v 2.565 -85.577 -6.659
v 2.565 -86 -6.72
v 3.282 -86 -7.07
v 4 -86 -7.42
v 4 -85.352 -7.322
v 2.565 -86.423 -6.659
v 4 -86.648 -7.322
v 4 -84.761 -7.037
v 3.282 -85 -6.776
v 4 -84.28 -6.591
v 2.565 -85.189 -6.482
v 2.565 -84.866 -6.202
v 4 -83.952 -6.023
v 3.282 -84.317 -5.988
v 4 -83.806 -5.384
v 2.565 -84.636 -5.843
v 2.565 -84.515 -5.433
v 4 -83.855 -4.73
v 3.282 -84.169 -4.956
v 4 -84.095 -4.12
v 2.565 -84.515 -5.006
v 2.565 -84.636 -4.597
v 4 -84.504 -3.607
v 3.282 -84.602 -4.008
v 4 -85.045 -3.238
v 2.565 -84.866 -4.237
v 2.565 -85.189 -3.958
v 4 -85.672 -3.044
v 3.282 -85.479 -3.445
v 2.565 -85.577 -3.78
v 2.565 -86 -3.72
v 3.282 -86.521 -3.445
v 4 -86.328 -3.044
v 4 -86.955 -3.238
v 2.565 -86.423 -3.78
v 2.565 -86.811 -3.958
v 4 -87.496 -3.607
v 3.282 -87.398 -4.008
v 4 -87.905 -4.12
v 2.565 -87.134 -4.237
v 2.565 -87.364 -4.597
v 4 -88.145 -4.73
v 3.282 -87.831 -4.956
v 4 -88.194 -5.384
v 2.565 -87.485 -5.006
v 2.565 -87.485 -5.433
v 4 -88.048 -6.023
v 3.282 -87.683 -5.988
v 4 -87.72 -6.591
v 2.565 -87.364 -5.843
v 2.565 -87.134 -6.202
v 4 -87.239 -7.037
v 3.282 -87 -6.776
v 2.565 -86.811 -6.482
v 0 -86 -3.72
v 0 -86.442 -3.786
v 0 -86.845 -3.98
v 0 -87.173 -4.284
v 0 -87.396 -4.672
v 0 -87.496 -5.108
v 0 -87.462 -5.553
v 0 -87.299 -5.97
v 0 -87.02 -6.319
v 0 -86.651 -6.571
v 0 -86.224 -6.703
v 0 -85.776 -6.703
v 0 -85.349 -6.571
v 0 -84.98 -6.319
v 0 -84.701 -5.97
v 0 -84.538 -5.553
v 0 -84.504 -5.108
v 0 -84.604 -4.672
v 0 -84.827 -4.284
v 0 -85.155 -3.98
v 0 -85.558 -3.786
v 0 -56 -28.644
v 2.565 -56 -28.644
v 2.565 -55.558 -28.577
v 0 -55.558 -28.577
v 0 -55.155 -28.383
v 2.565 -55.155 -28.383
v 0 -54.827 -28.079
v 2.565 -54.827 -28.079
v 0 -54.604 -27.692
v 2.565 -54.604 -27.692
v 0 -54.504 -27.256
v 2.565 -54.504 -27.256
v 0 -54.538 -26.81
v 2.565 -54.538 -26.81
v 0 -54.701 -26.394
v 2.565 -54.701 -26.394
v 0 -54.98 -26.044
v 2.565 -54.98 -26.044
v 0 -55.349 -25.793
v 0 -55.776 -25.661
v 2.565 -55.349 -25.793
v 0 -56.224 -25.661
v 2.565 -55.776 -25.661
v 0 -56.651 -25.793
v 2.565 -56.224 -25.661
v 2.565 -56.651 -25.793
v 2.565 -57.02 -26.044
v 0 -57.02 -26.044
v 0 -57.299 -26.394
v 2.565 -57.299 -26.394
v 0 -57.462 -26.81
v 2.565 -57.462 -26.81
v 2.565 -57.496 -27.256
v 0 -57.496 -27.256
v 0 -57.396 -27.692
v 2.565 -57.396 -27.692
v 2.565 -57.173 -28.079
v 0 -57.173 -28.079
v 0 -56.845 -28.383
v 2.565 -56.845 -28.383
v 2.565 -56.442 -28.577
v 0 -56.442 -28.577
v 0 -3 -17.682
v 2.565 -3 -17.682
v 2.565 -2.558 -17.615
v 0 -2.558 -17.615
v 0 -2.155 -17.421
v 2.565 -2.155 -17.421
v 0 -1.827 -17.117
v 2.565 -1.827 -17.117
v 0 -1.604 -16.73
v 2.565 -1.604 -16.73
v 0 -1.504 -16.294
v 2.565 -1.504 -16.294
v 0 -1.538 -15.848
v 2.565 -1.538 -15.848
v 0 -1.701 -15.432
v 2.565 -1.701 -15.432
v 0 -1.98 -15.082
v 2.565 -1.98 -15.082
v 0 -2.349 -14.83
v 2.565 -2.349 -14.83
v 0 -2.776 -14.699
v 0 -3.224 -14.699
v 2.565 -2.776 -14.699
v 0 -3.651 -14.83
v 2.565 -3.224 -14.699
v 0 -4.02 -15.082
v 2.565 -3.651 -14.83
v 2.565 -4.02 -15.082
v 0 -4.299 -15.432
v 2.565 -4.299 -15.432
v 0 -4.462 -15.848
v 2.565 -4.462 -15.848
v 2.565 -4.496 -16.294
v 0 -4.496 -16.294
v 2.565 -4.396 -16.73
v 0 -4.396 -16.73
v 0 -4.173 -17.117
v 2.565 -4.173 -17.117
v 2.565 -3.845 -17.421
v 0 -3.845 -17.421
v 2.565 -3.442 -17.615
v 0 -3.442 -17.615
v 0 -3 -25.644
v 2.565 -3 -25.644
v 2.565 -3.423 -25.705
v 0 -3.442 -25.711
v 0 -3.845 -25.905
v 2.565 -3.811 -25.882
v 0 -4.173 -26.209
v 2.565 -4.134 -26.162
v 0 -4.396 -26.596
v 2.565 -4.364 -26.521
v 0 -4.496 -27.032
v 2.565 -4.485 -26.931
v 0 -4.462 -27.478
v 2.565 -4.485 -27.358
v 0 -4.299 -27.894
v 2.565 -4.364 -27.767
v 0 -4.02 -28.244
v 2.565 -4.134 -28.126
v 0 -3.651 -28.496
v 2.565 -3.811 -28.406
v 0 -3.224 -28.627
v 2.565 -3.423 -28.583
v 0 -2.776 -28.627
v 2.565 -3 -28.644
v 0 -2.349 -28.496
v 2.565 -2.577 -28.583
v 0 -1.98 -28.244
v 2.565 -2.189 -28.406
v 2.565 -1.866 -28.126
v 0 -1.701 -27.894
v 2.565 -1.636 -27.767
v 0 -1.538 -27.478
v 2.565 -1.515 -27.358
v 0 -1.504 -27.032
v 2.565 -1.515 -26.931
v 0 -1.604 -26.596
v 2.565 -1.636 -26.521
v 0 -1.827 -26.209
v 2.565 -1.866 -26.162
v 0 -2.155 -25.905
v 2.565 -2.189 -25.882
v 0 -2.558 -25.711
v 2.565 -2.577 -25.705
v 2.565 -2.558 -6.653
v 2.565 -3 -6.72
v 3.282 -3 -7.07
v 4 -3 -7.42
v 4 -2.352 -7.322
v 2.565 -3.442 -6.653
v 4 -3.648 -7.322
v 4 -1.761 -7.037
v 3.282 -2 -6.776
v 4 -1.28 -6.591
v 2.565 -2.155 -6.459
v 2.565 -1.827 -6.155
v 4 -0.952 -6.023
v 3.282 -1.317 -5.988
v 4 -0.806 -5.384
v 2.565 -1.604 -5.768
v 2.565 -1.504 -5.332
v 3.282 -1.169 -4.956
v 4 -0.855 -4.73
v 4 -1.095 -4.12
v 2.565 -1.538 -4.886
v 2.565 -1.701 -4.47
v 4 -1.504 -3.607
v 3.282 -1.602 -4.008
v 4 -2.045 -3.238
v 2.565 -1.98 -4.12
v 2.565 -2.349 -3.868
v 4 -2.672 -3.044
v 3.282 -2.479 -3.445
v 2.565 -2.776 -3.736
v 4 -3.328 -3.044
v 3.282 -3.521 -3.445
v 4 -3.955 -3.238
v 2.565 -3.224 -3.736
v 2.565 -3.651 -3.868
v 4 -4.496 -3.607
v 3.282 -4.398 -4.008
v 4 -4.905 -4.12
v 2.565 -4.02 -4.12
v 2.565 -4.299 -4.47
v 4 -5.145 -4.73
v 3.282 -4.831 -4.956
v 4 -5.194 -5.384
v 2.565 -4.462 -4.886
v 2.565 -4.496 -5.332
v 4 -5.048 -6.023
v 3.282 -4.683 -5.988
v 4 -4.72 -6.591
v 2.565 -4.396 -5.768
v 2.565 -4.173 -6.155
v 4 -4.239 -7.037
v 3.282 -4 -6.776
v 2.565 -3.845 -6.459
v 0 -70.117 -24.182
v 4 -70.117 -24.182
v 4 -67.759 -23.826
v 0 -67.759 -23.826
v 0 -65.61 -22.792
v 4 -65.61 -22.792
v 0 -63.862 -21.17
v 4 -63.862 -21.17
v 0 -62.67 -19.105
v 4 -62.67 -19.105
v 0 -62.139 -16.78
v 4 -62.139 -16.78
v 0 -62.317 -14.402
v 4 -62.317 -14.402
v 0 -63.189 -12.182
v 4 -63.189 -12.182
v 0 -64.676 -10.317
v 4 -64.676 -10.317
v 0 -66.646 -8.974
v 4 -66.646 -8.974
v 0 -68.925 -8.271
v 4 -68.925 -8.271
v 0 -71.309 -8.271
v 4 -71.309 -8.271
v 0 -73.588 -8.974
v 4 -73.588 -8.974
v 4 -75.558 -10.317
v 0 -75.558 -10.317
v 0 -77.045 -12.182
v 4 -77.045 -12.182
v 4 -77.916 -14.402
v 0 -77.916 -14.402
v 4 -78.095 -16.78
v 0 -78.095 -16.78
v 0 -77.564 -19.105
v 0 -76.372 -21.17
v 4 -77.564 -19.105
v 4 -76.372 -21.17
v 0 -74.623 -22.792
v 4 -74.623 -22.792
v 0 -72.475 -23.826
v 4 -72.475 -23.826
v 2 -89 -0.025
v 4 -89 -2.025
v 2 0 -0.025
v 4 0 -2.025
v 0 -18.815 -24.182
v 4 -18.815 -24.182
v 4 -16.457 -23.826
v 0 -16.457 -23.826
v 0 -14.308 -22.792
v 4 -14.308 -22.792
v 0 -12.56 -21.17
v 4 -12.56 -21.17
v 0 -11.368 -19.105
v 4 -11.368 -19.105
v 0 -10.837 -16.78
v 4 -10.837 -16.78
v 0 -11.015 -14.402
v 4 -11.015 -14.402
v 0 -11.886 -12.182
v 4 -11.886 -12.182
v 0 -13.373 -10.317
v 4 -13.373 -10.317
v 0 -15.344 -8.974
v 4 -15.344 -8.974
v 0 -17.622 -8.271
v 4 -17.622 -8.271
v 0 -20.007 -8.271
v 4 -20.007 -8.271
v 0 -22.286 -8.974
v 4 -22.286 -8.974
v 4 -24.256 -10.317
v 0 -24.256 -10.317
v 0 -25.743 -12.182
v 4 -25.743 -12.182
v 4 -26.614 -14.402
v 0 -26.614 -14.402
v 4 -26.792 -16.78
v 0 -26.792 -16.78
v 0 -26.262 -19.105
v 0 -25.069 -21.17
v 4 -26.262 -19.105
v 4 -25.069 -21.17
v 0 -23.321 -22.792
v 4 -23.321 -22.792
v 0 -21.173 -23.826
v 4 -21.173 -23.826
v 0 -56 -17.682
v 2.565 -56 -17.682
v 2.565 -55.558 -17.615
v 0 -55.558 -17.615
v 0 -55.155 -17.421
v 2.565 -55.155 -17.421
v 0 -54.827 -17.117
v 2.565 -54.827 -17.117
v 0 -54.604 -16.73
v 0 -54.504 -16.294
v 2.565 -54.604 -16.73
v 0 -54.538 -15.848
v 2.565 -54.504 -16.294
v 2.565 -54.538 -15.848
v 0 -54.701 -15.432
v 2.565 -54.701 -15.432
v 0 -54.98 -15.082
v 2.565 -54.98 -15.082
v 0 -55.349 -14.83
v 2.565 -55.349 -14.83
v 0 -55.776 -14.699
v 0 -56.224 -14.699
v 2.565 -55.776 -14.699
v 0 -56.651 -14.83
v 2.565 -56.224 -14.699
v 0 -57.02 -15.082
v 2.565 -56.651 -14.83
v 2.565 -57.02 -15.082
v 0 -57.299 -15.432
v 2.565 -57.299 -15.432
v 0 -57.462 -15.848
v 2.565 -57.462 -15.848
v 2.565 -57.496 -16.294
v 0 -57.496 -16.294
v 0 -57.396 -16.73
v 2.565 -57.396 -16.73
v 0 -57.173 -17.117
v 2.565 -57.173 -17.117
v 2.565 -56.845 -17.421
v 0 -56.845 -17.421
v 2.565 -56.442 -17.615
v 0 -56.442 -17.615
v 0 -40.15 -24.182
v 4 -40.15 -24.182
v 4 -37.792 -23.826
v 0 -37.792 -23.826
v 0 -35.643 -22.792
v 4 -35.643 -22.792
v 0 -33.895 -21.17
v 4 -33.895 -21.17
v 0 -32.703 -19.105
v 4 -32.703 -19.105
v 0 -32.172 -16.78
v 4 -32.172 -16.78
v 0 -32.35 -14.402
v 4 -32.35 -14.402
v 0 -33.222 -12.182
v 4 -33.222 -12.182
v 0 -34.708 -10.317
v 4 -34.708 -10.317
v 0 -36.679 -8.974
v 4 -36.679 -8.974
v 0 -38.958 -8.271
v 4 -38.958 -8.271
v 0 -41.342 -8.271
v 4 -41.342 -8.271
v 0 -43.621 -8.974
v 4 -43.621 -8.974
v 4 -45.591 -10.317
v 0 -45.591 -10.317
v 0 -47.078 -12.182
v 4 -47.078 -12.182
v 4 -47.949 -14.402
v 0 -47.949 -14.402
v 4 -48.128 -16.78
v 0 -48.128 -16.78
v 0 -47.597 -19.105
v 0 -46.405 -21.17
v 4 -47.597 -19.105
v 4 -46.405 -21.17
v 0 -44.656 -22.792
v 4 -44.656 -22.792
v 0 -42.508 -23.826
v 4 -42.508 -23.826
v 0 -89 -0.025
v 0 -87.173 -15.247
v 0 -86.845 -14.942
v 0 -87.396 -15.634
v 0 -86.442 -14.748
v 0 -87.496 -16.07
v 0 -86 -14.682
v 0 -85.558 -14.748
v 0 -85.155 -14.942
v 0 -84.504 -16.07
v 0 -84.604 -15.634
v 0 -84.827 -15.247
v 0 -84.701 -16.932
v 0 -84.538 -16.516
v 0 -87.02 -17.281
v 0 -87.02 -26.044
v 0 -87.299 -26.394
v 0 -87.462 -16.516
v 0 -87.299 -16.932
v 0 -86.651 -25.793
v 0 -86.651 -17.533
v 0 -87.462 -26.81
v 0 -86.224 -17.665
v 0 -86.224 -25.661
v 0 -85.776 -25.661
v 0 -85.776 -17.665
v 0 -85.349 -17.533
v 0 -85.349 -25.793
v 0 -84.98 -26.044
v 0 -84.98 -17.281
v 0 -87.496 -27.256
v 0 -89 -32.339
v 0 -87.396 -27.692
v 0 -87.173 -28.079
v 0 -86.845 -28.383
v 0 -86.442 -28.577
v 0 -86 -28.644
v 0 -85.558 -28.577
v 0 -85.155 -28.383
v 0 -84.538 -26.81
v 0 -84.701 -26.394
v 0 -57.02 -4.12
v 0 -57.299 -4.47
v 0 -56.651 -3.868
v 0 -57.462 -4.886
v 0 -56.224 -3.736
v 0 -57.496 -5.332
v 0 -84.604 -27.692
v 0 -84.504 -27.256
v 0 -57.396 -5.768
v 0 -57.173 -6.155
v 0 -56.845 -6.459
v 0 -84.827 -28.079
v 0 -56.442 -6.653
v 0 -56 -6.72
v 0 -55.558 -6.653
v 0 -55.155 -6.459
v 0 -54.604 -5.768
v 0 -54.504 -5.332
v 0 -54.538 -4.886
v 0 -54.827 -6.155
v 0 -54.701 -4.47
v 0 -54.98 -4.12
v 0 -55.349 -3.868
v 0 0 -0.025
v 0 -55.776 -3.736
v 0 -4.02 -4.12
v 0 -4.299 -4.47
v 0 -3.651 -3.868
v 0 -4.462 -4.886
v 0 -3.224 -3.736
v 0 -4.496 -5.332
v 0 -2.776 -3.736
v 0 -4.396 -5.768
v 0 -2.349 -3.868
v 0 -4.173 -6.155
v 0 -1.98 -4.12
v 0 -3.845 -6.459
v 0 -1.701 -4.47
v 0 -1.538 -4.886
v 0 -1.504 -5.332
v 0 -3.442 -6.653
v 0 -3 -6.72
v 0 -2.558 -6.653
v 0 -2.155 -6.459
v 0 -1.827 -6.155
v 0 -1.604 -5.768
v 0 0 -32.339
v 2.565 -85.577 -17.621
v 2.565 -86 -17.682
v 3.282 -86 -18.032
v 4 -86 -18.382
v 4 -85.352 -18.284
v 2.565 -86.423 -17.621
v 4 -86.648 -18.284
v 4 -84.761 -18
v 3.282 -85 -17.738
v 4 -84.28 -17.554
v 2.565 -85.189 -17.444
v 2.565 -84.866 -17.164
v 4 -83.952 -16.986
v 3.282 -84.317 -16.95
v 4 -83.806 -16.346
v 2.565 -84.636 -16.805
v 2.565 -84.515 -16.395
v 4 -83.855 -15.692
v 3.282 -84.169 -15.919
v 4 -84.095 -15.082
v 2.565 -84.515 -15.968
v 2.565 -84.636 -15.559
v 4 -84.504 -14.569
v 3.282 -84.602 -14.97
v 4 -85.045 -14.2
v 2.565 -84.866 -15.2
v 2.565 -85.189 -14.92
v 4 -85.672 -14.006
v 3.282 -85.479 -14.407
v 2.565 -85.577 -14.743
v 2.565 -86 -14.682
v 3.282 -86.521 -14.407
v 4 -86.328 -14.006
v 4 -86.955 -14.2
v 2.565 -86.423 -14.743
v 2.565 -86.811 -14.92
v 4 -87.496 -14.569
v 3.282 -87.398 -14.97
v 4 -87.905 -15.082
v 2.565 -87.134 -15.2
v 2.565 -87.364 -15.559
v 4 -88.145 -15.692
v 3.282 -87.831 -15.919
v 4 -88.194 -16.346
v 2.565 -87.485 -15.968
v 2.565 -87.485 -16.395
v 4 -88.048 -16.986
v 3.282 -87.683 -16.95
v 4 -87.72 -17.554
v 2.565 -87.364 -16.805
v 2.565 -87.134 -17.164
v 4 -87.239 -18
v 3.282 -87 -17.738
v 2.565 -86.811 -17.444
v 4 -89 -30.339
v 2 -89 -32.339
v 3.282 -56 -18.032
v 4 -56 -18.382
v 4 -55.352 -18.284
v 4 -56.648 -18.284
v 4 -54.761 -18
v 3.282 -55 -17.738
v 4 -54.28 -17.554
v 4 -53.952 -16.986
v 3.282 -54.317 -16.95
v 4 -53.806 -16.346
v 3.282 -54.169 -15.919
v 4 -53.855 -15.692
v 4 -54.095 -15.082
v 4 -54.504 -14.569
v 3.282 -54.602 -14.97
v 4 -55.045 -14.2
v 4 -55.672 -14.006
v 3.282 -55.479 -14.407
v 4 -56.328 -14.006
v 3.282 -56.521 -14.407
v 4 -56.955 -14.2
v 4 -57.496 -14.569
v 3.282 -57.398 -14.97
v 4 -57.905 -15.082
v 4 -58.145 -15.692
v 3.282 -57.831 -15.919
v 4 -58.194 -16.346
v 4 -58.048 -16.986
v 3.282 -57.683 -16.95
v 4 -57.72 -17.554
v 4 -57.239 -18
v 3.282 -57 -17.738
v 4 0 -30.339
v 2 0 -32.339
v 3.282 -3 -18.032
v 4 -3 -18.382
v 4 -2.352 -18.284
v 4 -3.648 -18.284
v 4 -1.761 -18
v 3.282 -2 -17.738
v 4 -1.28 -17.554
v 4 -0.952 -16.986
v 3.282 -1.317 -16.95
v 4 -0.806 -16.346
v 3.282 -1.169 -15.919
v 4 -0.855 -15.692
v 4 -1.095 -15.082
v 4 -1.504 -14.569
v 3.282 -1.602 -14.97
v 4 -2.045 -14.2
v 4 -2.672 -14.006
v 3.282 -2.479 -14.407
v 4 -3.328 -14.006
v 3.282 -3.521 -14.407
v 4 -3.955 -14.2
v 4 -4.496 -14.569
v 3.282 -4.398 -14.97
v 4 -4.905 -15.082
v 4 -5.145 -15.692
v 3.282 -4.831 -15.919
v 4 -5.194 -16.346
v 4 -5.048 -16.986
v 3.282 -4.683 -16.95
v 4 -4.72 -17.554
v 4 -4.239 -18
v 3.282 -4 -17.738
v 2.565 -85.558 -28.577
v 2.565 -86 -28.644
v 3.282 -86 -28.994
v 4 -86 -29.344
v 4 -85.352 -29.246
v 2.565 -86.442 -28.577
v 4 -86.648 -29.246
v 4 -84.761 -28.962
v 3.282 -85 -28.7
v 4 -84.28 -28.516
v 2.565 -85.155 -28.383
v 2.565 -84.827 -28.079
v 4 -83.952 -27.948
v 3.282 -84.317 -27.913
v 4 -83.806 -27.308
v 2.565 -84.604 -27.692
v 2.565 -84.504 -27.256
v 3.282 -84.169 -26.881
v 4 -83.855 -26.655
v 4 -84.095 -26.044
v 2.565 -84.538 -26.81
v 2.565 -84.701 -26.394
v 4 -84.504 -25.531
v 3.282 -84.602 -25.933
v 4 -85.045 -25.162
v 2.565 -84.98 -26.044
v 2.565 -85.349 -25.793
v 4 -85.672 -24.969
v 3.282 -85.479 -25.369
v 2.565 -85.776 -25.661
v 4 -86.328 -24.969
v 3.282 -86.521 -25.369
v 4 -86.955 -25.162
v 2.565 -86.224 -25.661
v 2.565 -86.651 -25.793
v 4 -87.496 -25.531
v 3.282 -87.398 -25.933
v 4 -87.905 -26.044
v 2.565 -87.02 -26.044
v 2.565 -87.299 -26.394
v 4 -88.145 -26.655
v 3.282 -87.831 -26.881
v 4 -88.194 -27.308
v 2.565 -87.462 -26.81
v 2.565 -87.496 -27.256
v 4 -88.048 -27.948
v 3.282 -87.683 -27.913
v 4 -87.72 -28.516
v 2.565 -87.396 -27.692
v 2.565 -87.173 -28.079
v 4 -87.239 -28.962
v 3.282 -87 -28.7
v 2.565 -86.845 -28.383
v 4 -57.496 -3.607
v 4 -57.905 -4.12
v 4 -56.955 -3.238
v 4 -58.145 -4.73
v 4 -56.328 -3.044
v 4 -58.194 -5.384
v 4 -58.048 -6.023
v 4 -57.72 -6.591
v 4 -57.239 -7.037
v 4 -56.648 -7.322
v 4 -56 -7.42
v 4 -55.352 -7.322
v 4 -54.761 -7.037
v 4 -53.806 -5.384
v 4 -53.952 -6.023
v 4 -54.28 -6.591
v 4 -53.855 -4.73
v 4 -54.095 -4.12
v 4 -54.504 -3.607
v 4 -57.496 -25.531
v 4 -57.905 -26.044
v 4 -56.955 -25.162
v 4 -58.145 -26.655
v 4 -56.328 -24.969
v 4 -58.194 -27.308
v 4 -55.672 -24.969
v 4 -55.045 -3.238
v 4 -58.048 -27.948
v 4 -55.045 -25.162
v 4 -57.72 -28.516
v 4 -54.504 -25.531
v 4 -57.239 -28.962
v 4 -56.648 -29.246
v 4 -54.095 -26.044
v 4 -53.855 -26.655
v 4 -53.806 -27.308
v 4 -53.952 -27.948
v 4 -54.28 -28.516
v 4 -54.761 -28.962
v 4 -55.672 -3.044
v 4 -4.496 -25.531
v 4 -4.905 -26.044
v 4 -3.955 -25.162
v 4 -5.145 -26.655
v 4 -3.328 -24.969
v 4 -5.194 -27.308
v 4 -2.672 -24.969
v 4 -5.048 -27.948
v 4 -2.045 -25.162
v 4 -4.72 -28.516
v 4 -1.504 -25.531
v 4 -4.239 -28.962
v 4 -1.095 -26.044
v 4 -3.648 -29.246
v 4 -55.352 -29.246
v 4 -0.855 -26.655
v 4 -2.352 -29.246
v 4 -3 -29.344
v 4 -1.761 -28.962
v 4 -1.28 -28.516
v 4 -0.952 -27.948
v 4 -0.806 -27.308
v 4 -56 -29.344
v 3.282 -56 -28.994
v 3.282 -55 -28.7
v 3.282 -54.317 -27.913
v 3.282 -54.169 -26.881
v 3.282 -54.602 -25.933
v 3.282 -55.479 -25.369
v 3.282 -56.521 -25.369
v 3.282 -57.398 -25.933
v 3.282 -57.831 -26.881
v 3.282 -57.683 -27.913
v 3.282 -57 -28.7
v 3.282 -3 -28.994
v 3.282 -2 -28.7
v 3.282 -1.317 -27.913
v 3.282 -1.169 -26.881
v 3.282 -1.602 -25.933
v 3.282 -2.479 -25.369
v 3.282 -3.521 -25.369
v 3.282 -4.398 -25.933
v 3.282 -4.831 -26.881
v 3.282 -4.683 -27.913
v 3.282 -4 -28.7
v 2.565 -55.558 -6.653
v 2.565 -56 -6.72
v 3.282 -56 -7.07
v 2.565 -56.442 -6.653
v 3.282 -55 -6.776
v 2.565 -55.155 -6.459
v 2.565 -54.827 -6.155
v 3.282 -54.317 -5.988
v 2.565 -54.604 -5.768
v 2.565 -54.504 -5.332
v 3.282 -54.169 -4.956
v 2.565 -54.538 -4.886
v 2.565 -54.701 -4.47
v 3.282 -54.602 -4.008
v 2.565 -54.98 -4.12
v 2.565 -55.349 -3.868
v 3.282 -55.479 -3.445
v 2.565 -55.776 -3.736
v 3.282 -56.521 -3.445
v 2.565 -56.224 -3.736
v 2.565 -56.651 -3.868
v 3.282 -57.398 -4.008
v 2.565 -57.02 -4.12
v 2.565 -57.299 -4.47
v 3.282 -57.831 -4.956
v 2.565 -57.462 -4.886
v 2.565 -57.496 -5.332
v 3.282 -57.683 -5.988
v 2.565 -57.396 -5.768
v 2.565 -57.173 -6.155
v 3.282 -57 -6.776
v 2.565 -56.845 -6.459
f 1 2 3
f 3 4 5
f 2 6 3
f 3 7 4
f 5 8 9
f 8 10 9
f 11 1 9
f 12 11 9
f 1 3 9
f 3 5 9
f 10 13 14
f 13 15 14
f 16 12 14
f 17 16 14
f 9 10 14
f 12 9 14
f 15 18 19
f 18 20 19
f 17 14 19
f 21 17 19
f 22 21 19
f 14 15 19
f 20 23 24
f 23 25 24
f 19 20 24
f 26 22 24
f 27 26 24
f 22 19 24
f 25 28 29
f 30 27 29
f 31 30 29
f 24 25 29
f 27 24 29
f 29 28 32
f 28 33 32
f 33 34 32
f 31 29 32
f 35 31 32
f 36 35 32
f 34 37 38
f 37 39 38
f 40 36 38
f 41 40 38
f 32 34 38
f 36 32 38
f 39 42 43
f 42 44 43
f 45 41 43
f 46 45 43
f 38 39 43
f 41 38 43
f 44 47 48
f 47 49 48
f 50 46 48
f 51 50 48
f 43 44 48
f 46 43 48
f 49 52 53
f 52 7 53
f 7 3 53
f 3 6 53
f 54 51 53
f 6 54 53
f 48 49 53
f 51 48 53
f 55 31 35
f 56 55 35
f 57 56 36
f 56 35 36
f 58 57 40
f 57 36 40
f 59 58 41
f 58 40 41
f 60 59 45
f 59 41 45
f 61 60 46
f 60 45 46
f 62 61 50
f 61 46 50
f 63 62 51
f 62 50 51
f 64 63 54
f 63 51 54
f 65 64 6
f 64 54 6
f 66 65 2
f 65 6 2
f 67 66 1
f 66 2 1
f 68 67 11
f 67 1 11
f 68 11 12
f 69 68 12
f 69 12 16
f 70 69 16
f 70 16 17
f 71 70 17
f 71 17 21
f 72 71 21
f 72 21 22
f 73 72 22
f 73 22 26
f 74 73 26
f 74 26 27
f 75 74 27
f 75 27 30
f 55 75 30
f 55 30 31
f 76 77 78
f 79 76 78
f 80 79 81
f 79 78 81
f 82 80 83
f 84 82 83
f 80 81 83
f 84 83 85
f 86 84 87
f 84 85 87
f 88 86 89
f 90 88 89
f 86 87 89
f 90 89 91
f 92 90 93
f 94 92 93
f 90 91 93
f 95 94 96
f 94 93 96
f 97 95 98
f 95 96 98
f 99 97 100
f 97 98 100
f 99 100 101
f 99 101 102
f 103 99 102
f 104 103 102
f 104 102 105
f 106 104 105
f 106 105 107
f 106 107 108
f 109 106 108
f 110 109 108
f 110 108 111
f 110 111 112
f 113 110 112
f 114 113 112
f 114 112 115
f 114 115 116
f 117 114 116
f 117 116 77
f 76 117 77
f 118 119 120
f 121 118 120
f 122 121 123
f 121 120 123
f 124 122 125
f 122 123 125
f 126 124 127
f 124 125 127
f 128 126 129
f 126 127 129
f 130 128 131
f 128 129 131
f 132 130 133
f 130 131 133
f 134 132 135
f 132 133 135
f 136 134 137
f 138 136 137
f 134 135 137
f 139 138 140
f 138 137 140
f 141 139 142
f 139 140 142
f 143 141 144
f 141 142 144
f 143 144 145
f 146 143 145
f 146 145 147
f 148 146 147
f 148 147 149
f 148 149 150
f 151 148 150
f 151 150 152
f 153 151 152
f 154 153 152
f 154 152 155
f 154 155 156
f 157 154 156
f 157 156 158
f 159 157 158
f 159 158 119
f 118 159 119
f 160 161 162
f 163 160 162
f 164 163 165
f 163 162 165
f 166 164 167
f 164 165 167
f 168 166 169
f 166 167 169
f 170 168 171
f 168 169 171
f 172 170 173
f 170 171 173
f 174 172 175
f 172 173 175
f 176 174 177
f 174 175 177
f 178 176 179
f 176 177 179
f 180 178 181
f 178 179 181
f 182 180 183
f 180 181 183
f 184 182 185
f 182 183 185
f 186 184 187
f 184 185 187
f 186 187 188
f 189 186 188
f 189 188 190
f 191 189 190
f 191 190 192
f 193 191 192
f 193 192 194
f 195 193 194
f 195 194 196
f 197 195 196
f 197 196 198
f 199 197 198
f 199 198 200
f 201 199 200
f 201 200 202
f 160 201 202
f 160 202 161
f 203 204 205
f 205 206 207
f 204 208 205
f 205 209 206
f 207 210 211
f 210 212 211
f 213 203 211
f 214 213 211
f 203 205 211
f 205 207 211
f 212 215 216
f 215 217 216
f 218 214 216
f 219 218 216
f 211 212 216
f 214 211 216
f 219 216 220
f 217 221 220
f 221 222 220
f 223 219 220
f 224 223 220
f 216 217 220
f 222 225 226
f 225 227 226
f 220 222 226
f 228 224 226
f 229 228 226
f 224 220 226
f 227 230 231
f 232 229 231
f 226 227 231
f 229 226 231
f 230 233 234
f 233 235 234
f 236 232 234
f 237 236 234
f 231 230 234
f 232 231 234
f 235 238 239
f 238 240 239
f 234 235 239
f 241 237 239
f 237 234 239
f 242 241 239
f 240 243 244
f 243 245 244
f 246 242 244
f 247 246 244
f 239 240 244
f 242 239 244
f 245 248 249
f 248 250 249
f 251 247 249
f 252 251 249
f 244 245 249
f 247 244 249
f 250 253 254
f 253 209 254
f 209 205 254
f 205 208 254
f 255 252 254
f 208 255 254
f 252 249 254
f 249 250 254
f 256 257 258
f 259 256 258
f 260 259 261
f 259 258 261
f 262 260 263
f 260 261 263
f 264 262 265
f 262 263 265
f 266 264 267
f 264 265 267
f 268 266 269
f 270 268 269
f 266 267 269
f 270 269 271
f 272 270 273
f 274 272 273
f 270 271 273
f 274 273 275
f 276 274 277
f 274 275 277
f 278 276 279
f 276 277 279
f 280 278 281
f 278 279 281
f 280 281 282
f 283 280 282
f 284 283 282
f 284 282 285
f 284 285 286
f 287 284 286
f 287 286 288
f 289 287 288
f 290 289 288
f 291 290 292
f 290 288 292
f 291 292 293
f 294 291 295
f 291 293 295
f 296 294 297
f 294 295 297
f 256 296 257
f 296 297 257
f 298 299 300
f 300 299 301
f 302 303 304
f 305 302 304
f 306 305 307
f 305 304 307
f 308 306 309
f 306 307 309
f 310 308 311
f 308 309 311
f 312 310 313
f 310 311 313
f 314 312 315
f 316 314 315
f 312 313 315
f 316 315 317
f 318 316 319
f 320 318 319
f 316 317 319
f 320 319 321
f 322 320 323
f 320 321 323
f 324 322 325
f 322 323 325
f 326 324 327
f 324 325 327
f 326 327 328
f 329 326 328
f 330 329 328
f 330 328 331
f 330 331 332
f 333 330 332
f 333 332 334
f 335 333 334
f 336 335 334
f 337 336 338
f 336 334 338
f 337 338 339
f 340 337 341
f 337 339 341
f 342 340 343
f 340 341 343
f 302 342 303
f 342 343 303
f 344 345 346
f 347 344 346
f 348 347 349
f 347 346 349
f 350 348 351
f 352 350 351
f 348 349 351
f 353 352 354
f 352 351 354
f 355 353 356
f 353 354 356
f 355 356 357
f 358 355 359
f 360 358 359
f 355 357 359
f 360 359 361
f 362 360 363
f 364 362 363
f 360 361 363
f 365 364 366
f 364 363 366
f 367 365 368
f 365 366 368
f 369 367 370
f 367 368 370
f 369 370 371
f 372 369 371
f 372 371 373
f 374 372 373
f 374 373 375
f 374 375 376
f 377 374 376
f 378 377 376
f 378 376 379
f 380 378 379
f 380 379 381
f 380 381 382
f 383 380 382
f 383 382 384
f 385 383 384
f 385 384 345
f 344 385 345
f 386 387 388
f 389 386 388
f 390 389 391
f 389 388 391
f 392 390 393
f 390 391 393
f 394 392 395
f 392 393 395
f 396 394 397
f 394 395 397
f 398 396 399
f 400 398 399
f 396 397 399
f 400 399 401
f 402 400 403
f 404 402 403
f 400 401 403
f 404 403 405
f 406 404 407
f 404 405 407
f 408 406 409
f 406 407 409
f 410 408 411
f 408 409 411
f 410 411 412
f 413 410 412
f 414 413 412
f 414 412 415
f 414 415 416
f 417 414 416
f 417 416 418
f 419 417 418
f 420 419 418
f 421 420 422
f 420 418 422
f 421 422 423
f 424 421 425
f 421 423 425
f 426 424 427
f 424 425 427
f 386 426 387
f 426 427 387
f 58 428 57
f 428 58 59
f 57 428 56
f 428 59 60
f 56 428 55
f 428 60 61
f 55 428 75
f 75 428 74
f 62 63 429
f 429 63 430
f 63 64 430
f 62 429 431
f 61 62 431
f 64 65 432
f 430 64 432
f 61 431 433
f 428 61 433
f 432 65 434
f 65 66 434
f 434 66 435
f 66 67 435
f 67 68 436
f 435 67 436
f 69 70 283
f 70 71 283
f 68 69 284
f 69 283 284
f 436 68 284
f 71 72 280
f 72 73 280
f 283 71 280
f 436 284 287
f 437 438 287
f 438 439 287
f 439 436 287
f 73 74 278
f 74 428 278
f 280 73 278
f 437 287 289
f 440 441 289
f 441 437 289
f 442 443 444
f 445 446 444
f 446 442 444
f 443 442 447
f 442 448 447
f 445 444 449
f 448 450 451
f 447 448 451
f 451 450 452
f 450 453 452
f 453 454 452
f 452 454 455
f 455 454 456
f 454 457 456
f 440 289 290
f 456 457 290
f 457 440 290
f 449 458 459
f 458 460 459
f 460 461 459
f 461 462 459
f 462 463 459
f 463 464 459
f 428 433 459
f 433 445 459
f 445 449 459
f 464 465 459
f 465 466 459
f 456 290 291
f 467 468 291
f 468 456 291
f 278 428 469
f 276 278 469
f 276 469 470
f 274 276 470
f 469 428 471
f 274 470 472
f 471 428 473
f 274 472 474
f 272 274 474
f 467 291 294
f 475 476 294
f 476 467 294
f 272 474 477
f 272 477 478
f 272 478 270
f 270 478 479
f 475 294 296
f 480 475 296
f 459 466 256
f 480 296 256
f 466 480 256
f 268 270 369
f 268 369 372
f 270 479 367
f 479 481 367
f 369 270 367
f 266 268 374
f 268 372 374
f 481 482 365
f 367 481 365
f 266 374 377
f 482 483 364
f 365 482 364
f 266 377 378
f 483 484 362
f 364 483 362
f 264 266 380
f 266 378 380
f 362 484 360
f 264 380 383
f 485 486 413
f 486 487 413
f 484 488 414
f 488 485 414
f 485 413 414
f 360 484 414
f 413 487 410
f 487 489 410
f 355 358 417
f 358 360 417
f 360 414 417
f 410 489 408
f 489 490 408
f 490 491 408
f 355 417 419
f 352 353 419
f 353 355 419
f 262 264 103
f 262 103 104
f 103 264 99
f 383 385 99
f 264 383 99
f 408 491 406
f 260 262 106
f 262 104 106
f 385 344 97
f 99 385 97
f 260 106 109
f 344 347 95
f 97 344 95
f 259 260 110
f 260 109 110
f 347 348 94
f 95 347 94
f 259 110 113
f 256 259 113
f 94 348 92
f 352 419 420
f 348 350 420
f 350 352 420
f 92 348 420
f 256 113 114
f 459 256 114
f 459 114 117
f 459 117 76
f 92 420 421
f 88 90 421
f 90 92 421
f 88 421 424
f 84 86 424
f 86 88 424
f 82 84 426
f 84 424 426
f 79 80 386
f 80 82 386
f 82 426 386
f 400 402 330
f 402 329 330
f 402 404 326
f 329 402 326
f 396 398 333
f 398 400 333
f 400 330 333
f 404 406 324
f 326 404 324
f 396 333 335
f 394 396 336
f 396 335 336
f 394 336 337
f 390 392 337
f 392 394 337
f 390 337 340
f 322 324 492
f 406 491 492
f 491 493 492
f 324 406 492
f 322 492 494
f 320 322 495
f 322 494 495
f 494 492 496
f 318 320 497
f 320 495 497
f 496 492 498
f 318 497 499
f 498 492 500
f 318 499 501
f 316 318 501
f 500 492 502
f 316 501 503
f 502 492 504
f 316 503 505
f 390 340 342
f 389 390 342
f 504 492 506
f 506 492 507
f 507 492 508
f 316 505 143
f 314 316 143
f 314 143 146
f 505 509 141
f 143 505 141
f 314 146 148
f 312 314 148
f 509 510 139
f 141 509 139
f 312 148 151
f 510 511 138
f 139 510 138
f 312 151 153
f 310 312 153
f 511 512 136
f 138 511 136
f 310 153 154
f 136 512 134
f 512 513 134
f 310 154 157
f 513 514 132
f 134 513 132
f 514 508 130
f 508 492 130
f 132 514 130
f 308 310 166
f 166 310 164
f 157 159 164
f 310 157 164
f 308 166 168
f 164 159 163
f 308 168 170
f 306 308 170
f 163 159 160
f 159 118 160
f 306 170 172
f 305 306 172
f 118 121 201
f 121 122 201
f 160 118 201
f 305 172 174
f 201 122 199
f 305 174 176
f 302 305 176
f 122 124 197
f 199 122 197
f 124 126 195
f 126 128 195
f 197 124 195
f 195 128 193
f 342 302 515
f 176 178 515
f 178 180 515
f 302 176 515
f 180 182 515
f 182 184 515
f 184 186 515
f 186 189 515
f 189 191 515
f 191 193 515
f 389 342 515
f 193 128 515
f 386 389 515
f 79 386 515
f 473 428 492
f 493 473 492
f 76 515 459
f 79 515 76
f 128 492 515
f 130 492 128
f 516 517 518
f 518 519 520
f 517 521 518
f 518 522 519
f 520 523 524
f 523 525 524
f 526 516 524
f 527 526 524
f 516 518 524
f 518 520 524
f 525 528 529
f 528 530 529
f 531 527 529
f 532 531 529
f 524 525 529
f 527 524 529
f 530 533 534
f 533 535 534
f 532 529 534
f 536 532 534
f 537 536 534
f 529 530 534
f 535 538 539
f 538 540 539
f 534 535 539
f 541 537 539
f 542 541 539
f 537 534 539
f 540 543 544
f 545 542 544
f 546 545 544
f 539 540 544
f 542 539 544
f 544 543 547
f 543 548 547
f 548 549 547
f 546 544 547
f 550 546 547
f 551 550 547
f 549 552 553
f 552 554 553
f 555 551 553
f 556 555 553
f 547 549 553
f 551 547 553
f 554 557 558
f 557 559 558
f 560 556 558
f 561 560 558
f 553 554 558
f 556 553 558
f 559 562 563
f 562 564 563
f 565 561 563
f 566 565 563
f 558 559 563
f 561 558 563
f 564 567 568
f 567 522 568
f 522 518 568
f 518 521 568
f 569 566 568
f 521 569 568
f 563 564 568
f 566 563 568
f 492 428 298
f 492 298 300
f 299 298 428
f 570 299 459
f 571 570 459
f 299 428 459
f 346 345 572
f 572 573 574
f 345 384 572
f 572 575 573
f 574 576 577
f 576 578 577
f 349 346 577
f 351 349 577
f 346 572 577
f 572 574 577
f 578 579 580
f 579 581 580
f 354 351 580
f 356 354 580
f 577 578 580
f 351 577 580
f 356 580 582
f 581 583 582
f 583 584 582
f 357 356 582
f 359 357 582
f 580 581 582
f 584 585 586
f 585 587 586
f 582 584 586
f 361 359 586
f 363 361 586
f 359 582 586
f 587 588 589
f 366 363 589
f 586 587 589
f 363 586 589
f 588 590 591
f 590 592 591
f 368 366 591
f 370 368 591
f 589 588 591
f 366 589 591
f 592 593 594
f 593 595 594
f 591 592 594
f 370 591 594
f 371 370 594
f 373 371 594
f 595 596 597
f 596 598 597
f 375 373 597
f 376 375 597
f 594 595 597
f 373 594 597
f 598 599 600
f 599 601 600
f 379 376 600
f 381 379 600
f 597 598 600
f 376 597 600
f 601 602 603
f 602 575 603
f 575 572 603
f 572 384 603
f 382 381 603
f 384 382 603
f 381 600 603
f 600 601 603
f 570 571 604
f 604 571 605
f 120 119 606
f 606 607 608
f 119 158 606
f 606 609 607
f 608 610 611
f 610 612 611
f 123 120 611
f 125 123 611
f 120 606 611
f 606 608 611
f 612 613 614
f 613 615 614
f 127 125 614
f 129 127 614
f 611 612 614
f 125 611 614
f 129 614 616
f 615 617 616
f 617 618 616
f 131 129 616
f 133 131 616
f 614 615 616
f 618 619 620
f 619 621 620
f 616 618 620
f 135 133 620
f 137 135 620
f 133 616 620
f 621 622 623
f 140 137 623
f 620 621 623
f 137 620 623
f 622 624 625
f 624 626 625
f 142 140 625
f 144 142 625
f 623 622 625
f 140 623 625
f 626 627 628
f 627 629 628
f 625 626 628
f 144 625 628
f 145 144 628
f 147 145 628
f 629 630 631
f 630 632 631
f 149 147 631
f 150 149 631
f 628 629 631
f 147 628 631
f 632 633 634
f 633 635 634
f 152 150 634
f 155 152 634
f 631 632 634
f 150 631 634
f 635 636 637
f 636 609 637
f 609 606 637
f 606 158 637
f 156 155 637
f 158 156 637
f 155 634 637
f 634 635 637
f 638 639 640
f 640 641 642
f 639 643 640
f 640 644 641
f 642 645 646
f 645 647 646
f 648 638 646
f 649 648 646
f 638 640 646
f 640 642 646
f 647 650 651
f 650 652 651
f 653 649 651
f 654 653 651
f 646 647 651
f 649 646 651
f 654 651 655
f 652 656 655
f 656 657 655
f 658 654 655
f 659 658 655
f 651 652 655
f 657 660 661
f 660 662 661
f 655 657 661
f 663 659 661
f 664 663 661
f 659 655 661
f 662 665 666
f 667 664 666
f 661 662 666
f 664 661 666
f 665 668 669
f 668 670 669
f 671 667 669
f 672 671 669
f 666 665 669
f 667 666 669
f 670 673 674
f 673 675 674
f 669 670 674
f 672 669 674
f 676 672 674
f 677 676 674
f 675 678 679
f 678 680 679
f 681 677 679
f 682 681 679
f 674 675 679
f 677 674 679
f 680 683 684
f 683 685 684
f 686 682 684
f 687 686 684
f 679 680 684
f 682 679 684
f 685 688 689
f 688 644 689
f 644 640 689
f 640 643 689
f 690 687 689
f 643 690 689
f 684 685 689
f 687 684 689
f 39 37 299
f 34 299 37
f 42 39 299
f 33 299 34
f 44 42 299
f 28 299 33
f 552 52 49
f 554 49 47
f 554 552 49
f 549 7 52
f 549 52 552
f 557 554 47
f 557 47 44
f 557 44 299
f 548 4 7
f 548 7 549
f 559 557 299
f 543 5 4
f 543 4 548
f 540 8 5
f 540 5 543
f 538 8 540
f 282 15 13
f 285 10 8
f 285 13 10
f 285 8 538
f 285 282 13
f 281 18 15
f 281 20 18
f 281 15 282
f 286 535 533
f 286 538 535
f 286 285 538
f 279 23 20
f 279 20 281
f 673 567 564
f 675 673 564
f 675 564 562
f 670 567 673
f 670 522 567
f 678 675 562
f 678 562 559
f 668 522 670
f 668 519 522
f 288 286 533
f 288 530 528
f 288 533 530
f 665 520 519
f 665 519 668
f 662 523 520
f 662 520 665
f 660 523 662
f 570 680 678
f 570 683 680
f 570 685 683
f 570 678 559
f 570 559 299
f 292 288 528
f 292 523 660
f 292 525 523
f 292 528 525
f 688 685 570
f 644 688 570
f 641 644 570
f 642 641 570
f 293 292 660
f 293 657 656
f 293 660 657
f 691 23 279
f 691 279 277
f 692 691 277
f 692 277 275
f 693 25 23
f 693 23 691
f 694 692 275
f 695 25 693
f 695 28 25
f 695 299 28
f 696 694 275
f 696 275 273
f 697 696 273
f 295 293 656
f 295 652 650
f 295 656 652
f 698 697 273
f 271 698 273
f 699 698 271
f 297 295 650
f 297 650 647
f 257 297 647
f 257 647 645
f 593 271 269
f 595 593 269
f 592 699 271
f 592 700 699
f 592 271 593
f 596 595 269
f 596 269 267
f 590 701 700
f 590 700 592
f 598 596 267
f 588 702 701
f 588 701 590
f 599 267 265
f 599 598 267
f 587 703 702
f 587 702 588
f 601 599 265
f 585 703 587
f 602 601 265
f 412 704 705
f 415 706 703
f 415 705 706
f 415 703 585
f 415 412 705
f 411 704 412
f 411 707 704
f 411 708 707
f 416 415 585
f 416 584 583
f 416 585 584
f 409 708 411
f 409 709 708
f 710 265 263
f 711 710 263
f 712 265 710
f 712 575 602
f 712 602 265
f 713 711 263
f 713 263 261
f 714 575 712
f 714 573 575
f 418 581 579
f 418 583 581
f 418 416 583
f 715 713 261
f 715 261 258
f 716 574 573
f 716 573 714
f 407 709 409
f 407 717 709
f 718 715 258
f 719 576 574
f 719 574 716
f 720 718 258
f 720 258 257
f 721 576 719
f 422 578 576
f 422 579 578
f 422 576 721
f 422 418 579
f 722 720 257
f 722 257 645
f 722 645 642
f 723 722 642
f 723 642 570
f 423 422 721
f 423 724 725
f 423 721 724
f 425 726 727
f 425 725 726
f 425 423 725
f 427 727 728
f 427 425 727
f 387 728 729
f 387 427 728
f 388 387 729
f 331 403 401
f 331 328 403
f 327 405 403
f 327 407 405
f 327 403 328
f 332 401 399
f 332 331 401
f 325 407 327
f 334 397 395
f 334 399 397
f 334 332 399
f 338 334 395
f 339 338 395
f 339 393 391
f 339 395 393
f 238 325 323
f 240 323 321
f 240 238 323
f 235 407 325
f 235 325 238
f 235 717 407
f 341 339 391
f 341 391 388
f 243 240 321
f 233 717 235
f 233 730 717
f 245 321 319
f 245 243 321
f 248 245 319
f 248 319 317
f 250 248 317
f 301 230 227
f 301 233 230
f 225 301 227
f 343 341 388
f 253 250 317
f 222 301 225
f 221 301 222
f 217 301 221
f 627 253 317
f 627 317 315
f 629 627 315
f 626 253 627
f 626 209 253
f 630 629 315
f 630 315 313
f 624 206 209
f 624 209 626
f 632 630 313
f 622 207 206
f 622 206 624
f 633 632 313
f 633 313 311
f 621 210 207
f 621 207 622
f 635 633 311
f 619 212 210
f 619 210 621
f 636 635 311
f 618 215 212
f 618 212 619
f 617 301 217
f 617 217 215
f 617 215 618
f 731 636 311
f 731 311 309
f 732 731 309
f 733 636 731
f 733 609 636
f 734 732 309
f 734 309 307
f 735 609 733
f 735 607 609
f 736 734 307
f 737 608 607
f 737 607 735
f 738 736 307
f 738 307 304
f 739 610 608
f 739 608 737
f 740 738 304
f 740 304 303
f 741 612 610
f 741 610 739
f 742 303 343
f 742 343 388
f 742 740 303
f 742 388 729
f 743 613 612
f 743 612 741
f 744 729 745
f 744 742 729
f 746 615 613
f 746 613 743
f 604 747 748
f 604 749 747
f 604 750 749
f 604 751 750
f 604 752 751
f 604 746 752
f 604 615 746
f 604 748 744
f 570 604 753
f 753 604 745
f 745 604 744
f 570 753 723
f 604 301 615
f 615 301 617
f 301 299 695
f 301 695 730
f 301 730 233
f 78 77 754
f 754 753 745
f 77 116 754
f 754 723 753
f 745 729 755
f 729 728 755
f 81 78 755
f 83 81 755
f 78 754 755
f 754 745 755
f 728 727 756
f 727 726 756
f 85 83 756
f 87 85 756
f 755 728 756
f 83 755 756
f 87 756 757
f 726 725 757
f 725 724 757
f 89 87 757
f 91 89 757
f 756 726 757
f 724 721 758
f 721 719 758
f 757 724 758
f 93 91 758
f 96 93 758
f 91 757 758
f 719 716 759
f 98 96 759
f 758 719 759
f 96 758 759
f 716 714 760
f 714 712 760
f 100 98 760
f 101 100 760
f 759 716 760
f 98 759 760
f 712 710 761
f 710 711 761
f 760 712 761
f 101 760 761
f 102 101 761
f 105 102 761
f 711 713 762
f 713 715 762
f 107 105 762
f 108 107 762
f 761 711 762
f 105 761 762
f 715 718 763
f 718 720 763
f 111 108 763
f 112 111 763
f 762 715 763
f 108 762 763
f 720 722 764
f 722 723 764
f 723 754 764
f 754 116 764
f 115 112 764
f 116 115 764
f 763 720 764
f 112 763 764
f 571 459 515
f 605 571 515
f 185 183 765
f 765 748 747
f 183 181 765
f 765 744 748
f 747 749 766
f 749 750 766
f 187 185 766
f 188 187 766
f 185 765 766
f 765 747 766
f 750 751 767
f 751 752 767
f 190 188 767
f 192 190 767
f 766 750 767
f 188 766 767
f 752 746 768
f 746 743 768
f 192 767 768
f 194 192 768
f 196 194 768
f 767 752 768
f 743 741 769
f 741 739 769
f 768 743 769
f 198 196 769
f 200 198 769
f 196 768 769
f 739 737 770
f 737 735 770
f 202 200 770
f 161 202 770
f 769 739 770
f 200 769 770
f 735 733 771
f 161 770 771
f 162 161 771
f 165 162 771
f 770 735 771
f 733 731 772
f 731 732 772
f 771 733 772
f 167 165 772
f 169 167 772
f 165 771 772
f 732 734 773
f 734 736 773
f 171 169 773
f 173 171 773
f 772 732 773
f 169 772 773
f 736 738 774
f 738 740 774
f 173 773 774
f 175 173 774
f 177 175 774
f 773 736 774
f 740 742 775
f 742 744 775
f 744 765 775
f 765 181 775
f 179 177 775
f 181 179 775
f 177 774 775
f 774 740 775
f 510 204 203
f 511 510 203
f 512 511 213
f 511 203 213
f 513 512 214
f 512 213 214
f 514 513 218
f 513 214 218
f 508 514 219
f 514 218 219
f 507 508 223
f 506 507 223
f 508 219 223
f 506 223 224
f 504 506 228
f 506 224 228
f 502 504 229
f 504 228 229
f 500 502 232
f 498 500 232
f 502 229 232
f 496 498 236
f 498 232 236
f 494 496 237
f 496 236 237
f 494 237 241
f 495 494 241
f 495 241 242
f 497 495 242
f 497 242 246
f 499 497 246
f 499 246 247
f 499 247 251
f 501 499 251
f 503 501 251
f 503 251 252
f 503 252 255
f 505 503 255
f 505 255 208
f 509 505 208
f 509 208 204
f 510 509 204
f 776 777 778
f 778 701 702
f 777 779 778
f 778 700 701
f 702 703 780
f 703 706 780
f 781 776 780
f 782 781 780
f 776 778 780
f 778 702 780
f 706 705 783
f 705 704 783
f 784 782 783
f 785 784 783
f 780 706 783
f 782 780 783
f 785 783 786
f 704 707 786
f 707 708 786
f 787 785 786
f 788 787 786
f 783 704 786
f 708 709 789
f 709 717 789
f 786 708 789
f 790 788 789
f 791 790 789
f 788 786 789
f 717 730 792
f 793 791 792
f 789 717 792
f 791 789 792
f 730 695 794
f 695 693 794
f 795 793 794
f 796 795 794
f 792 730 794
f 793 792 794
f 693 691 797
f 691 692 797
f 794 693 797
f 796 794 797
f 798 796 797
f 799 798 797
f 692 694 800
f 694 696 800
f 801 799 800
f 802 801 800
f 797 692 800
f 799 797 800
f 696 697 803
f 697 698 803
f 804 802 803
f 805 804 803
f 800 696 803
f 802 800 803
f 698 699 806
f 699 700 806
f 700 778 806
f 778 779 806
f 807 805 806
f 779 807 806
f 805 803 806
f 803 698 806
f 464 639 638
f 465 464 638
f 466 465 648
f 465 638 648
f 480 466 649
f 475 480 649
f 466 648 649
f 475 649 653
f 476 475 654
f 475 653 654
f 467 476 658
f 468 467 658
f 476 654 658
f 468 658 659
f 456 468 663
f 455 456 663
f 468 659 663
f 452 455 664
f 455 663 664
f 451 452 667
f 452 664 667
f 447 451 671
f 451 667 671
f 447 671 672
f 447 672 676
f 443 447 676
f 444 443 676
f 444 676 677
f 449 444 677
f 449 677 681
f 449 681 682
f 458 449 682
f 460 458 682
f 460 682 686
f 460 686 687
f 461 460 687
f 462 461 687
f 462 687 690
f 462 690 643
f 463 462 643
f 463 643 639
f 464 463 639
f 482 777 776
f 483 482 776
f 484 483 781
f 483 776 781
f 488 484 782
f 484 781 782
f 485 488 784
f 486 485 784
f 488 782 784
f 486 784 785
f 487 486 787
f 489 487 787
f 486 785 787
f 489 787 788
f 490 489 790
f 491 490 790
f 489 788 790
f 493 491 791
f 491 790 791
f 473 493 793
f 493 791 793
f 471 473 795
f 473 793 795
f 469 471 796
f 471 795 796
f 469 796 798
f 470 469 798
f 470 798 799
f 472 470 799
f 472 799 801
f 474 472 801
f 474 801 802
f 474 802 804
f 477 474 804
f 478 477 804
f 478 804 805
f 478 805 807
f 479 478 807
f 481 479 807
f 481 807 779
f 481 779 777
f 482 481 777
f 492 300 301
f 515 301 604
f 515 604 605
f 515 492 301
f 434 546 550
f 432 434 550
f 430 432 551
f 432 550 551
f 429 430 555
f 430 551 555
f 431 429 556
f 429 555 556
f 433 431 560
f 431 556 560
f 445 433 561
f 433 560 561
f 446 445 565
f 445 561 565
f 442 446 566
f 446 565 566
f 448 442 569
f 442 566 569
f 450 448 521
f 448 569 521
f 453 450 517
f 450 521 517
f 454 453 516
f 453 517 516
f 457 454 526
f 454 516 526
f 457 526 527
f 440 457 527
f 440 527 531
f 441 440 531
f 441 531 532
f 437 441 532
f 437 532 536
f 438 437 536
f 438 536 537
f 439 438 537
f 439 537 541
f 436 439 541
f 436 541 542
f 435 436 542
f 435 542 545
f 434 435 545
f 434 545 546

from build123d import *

# Parameters (mm, degrees)
SKETCH1_W                    = 32.31333688
SKETCH1_H                    = 89
EXTRUDE1_DEPTH               = 4
SKETCH2_R                    = 1.5
SKETCH2_R_2                  = 8
CUT_EXTRUDE1_DEPTH           = 4
CHAMFER1_SIZE                = 2
SKETCH4_R                    = 2.2
CUT_EXTRUDE2_DEPTH           = 1.5
CUT_EXTRUDE2_DRAFT           = -26
CUT_EXTRUDE2_PROFILE_2_DEPTH = 1.5
CUT_EXTRUDE2_PROFILE_2_DRAFT = -26
CUT_EXTRUDE2_PROFILE_3_DEPTH = 1.5
CUT_EXTRUDE2_PROFILE_3_DRAFT = -26
CUT_EXTRUDE2_PROFILE_4_DEPTH = 1.5
CUT_EXTRUDE2_PROFILE_4_DRAFT = -26
CUT_EXTRUDE2_PROFILE_5_DEPTH = 1.5
CUT_EXTRUDE2_PROFILE_5_DRAFT = -26
CUT_EXTRUDE2_PROFILE_6_DEPTH = 1.5
CUT_EXTRUDE2_PROFILE_6_DRAFT = -26
CUT_EXTRUDE2_PROFILE_7_DEPTH = 1.5
CUT_EXTRUDE2_PROFILE_7_DRAFT = -26
CUT_EXTRUDE2_PROFILE_8_DEPTH = 1.5
CUT_EXTRUDE2_PROFILE_8_DRAFT = -26
CUT_EXTRUDE2_PROFILE_9_DEPTH = 1.5
CUT_EXTRUDE2_PROFILE_9_DRAFT = -26


with BuildPart() as part:
    # Sketch1 → Extrude1 (new body)
    with BuildSketch(Plane(origin=(0, 0, 0), x_dir=(0, 0, -1), z_dir=(1, 0, 0))):
        with Locations((16.181856, -44.5)):
            Rectangle(SKETCH1_W, SKETCH1_H)
    extrude(amount=EXTRUDE1_DEPTH)

    # Sketch2 → Cut-Extrude1 (cut)
    with BuildSketch(Plane(origin=(4, 0, 0), x_dir=(0, 0, -1), z_dir=(1, 0, 0))):
        with Locations((5.219637339, -3)):
            Circle(SKETCH2_R)
        with Locations(Location((27.14407466, -3, 0), (0, 0, 180))):
            Circle(SKETCH2_R)
        with Locations((16.181856, -3)):
            Circle(SKETCH2_R)
        with Locations((27.14407466, -86)):
            Circle(SKETCH2_R)
        with Locations(Location((16.181856, -86, 0), (0, 0, 180))):
            Circle(SKETCH2_R)
        with Locations(Location((5.219637339, -86, 0), (0, 0, 180))):
            Circle(SKETCH2_R)
        with Locations((5.219637339, -56)):
            Circle(SKETCH2_R)
        with Locations((16.181856, -56)):
            Circle(SKETCH2_R)
        with Locations((27.14407466, -56)):
            Circle(SKETCH2_R)
        with Locations((16.181856, -18.814665041)):
            Circle(SKETCH2_R_2)
        with Locations((16.181856, -40.149876352)):
            Circle(SKETCH2_R_2)
        with Locations((16.181856, -70.116890711)):
            Circle(SKETCH2_R_2)
    extrude(amount=-CUT_EXTRUDE1_DEPTH, mode=Mode.SUBTRACT)

    # Chamfer1
    chamfer1_edges = [part.edges().sort_by_distance(p)[0] for p in [
        (4, -44.5, -32.33852444),
        (4, -44.5, -0.02518756),
    ]]
    chamfer(chamfer1_edges, length=CHAMFER1_SIZE)


with BuildPart() as cut_extrude2_tool:
    # Sketch4 → Cut-Extrude2 (with draft: the straight prism first)
    with BuildSketch(Plane(origin=(4, 0, 0), x_dir=(0, 0, -1), z_dir=(1, 0, 0))):
        with Locations((5.219637339, -3)):
            Circle(SKETCH4_R)
    extrude(amount=-CUT_EXTRUDE2_DEPTH)
    # Cut-Extrude2: the draft: its side faces are tilted about the plane it starts from
    cut_extrude2_sides = [cut_extrude2_tool.faces().sort_by_distance(p)[0] for p in [
        (3.25, -3, -3.019637339),
    ]]
    draft(cut_extrude2_sides, Plane(origin=(4, 0, 0), x_dir=(0, 0, -1), z_dir=(1, 0, 0)), CUT_EXTRUDE2_DRAFT)


with BuildPart() as part_1:
    add(part.part)

    # Cut-Extrude2: cut by cut_extrude2_tool
    add(cut_extrude2_tool.part, mode=Mode.SUBTRACT)


with BuildPart() as cut_extrude2_profile_2_tool:
    # Sketch4 → Cut-Extrude2 profile 2 (with draft: the straight prism first)
    with BuildSketch(Plane(origin=(4, 0, 0), x_dir=(0, 0, -1), z_dir=(1, 0, 0))):
        with Locations((16.181856, -3)):
            Circle(SKETCH4_R)
    extrude(amount=-CUT_EXTRUDE2_PROFILE_2_DEPTH)
    # Cut-Extrude2 profile 2: the draft: its side faces are tilted about the plane it starts from
    cut_extrude2_profile_2_sides = [cut_extrude2_profile_2_tool.faces().sort_by_distance(p)[0] for p in [
        (3.25, -3, -13.981856),
    ]]
    draft(cut_extrude2_profile_2_sides, Plane(origin=(4, 0, 0), x_dir=(0, 0, -1), z_dir=(1, 0, 0)), CUT_EXTRUDE2_PROFILE_2_DRAFT)


with BuildPart() as part_2:
    add(part_1.part)

    # Cut-Extrude2 profile 2: cut by cut_extrude2_profile_2_tool
    add(cut_extrude2_profile_2_tool.part, mode=Mode.SUBTRACT)


with BuildPart() as cut_extrude2_profile_3_tool:
    # Sketch4 → Cut-Extrude2 profile 3 (with draft: the straight prism first)
    with BuildSketch(Plane(origin=(4, 0, 0), x_dir=(0, 0, -1), z_dir=(1, 0, 0))):
        with Locations((27.14407466, -3)):
            Circle(SKETCH4_R)
    extrude(amount=-CUT_EXTRUDE2_PROFILE_3_DEPTH)
    # Cut-Extrude2 profile 3: the draft: its side faces are tilted about the plane it starts from
    cut_extrude2_profile_3_sides = [cut_extrude2_profile_3_tool.faces().sort_by_distance(p)[0] for p in [
        (3.25, -3, -24.94407466),
    ]]
    draft(cut_extrude2_profile_3_sides, Plane(origin=(4, 0, 0), x_dir=(0, 0, -1), z_dir=(1, 0, 0)), CUT_EXTRUDE2_PROFILE_3_DRAFT)


with BuildPart() as part_3:
    add(part_2.part)

    # Cut-Extrude2 profile 3: cut by cut_extrude2_profile_3_tool
    add(cut_extrude2_profile_3_tool.part, mode=Mode.SUBTRACT)


with BuildPart() as cut_extrude2_profile_4_tool:
    # Sketch4 → Cut-Extrude2 profile 4 (with draft: the straight prism first)
    with BuildSketch(Plane(origin=(4, 0, 0), x_dir=(0, 0, -1), z_dir=(1, 0, 0))):
        with Locations((5.219637339, -56)):
            Circle(SKETCH4_R)
    extrude(amount=-CUT_EXTRUDE2_PROFILE_4_DEPTH)
    # Cut-Extrude2 profile 4: the draft: its side faces are tilted about the plane it starts from
    cut_extrude2_profile_4_sides = [cut_extrude2_profile_4_tool.faces().sort_by_distance(p)[0] for p in [
        (3.25, -56, -3.019637339),
    ]]
    draft(cut_extrude2_profile_4_sides, Plane(origin=(4, 0, 0), x_dir=(0, 0, -1), z_dir=(1, 0, 0)), CUT_EXTRUDE2_PROFILE_4_DRAFT)


with BuildPart() as part_4:
    add(part_3.part)

    # Cut-Extrude2 profile 4: cut by cut_extrude2_profile_4_tool
    add(cut_extrude2_profile_4_tool.part, mode=Mode.SUBTRACT)


with BuildPart() as cut_extrude2_profile_5_tool:
    # Sketch4 → Cut-Extrude2 profile 5 (with draft: the straight prism first)
    with BuildSketch(Plane(origin=(4, 0, 0), x_dir=(0, 0, -1), z_dir=(1, 0, 0))):
        with Locations((16.181856, -56)):
            Circle(SKETCH4_R)
    extrude(amount=-CUT_EXTRUDE2_PROFILE_5_DEPTH)
    # Cut-Extrude2 profile 5: the draft: its side faces are tilted about the plane it starts from
    cut_extrude2_profile_5_sides = [cut_extrude2_profile_5_tool.faces().sort_by_distance(p)[0] for p in [
        (3.25, -56, -13.981856),
    ]]
    draft(cut_extrude2_profile_5_sides, Plane(origin=(4, 0, 0), x_dir=(0, 0, -1), z_dir=(1, 0, 0)), CUT_EXTRUDE2_PROFILE_5_DRAFT)


with BuildPart() as part_5:
    add(part_4.part)

    # Cut-Extrude2 profile 5: cut by cut_extrude2_profile_5_tool
    add(cut_extrude2_profile_5_tool.part, mode=Mode.SUBTRACT)


with BuildPart() as cut_extrude2_profile_6_tool:
    # Sketch4 → Cut-Extrude2 profile 6 (with draft: the straight prism first)
    with BuildSketch(Plane(origin=(4, 0, 0), x_dir=(0, 0, -1), z_dir=(1, 0, 0))):
        with Locations((27.14407466, -56)):
            Circle(SKETCH4_R)
    extrude(amount=-CUT_EXTRUDE2_PROFILE_6_DEPTH)
    # Cut-Extrude2 profile 6: the draft: its side faces are tilted about the plane it starts from
    cut_extrude2_profile_6_sides = [cut_extrude2_profile_6_tool.faces().sort_by_distance(p)[0] for p in [
        (3.25, -56, -24.94407466),
    ]]
    draft(cut_extrude2_profile_6_sides, Plane(origin=(4, 0, 0), x_dir=(0, 0, -1), z_dir=(1, 0, 0)), CUT_EXTRUDE2_PROFILE_6_DRAFT)


with BuildPart() as part_6:
    add(part_5.part)

    # Cut-Extrude2 profile 6: cut by cut_extrude2_profile_6_tool
    add(cut_extrude2_profile_6_tool.part, mode=Mode.SUBTRACT)


with BuildPart() as cut_extrude2_profile_7_tool:
    # Sketch4 → Cut-Extrude2 profile 7 (with draft: the straight prism first)
    with BuildSketch(Plane(origin=(4, 0, 0), x_dir=(0, 0, -1), z_dir=(1, 0, 0))):
        with Locations((5.219637339, -86)):
            Circle(SKETCH4_R)
    extrude(amount=-CUT_EXTRUDE2_PROFILE_7_DEPTH)
    # Cut-Extrude2 profile 7: the draft: its side faces are tilted about the plane it starts from
    cut_extrude2_profile_7_sides = [cut_extrude2_profile_7_tool.faces().sort_by_distance(p)[0] for p in [
        (3.25, -86, -3.019637339),
    ]]
    draft(cut_extrude2_profile_7_sides, Plane(origin=(4, 0, 0), x_dir=(0, 0, -1), z_dir=(1, 0, 0)), CUT_EXTRUDE2_PROFILE_7_DRAFT)


with BuildPart() as part_7:
    add(part_6.part)

    # Cut-Extrude2 profile 7: cut by cut_extrude2_profile_7_tool
    add(cut_extrude2_profile_7_tool.part, mode=Mode.SUBTRACT)


with BuildPart() as cut_extrude2_profile_8_tool:
    # Sketch4 → Cut-Extrude2 profile 8 (with draft: the straight prism first)
    with BuildSketch(Plane(origin=(4, 0, 0), x_dir=(0, 0, -1), z_dir=(1, 0, 0))):
        with Locations((16.181856, -86)):
            Circle(SKETCH4_R)
    extrude(amount=-CUT_EXTRUDE2_PROFILE_8_DEPTH)
    # Cut-Extrude2 profile 8: the draft: its side faces are tilted about the plane it starts from
    cut_extrude2_profile_8_sides = [cut_extrude2_profile_8_tool.faces().sort_by_distance(p)[0] for p in [
        (3.25, -86, -13.981856),
    ]]
    draft(cut_extrude2_profile_8_sides, Plane(origin=(4, 0, 0), x_dir=(0, 0, -1), z_dir=(1, 0, 0)), CUT_EXTRUDE2_PROFILE_8_DRAFT)


with BuildPart() as part_8:
    add(part_7.part)

    # Cut-Extrude2 profile 8: cut by cut_extrude2_profile_8_tool
    add(cut_extrude2_profile_8_tool.part, mode=Mode.SUBTRACT)


with BuildPart() as cut_extrude2_profile_9_tool:
    # Sketch4 → Cut-Extrude2 profile 9 (with draft: the straight prism first)
    with BuildSketch(Plane(origin=(4, 0, 0), x_dir=(0, 0, -1), z_dir=(1, 0, 0))):
        with Locations((27.14407466, -86)):
            Circle(SKETCH4_R)
    extrude(amount=-CUT_EXTRUDE2_PROFILE_9_DEPTH)
    # Cut-Extrude2 profile 9: the draft: its side faces are tilted about the plane it starts from
    cut_extrude2_profile_9_sides = [cut_extrude2_profile_9_tool.faces().sort_by_distance(p)[0] for p in [
        (3.25, -86, -24.94407466),
    ]]
    draft(cut_extrude2_profile_9_sides, Plane(origin=(4, 0, 0), x_dir=(0, 0, -1), z_dir=(1, 0, 0)), CUT_EXTRUDE2_PROFILE_9_DRAFT)


with BuildPart() as part_9:
    add(part_8.part)

    # Cut-Extrude2 profile 9: cut by cut_extrude2_profile_9_tool
    add(cut_extrude2_profile_9_tool.part, mode=Mode.SUBTRACT)


solid = part_9.part
